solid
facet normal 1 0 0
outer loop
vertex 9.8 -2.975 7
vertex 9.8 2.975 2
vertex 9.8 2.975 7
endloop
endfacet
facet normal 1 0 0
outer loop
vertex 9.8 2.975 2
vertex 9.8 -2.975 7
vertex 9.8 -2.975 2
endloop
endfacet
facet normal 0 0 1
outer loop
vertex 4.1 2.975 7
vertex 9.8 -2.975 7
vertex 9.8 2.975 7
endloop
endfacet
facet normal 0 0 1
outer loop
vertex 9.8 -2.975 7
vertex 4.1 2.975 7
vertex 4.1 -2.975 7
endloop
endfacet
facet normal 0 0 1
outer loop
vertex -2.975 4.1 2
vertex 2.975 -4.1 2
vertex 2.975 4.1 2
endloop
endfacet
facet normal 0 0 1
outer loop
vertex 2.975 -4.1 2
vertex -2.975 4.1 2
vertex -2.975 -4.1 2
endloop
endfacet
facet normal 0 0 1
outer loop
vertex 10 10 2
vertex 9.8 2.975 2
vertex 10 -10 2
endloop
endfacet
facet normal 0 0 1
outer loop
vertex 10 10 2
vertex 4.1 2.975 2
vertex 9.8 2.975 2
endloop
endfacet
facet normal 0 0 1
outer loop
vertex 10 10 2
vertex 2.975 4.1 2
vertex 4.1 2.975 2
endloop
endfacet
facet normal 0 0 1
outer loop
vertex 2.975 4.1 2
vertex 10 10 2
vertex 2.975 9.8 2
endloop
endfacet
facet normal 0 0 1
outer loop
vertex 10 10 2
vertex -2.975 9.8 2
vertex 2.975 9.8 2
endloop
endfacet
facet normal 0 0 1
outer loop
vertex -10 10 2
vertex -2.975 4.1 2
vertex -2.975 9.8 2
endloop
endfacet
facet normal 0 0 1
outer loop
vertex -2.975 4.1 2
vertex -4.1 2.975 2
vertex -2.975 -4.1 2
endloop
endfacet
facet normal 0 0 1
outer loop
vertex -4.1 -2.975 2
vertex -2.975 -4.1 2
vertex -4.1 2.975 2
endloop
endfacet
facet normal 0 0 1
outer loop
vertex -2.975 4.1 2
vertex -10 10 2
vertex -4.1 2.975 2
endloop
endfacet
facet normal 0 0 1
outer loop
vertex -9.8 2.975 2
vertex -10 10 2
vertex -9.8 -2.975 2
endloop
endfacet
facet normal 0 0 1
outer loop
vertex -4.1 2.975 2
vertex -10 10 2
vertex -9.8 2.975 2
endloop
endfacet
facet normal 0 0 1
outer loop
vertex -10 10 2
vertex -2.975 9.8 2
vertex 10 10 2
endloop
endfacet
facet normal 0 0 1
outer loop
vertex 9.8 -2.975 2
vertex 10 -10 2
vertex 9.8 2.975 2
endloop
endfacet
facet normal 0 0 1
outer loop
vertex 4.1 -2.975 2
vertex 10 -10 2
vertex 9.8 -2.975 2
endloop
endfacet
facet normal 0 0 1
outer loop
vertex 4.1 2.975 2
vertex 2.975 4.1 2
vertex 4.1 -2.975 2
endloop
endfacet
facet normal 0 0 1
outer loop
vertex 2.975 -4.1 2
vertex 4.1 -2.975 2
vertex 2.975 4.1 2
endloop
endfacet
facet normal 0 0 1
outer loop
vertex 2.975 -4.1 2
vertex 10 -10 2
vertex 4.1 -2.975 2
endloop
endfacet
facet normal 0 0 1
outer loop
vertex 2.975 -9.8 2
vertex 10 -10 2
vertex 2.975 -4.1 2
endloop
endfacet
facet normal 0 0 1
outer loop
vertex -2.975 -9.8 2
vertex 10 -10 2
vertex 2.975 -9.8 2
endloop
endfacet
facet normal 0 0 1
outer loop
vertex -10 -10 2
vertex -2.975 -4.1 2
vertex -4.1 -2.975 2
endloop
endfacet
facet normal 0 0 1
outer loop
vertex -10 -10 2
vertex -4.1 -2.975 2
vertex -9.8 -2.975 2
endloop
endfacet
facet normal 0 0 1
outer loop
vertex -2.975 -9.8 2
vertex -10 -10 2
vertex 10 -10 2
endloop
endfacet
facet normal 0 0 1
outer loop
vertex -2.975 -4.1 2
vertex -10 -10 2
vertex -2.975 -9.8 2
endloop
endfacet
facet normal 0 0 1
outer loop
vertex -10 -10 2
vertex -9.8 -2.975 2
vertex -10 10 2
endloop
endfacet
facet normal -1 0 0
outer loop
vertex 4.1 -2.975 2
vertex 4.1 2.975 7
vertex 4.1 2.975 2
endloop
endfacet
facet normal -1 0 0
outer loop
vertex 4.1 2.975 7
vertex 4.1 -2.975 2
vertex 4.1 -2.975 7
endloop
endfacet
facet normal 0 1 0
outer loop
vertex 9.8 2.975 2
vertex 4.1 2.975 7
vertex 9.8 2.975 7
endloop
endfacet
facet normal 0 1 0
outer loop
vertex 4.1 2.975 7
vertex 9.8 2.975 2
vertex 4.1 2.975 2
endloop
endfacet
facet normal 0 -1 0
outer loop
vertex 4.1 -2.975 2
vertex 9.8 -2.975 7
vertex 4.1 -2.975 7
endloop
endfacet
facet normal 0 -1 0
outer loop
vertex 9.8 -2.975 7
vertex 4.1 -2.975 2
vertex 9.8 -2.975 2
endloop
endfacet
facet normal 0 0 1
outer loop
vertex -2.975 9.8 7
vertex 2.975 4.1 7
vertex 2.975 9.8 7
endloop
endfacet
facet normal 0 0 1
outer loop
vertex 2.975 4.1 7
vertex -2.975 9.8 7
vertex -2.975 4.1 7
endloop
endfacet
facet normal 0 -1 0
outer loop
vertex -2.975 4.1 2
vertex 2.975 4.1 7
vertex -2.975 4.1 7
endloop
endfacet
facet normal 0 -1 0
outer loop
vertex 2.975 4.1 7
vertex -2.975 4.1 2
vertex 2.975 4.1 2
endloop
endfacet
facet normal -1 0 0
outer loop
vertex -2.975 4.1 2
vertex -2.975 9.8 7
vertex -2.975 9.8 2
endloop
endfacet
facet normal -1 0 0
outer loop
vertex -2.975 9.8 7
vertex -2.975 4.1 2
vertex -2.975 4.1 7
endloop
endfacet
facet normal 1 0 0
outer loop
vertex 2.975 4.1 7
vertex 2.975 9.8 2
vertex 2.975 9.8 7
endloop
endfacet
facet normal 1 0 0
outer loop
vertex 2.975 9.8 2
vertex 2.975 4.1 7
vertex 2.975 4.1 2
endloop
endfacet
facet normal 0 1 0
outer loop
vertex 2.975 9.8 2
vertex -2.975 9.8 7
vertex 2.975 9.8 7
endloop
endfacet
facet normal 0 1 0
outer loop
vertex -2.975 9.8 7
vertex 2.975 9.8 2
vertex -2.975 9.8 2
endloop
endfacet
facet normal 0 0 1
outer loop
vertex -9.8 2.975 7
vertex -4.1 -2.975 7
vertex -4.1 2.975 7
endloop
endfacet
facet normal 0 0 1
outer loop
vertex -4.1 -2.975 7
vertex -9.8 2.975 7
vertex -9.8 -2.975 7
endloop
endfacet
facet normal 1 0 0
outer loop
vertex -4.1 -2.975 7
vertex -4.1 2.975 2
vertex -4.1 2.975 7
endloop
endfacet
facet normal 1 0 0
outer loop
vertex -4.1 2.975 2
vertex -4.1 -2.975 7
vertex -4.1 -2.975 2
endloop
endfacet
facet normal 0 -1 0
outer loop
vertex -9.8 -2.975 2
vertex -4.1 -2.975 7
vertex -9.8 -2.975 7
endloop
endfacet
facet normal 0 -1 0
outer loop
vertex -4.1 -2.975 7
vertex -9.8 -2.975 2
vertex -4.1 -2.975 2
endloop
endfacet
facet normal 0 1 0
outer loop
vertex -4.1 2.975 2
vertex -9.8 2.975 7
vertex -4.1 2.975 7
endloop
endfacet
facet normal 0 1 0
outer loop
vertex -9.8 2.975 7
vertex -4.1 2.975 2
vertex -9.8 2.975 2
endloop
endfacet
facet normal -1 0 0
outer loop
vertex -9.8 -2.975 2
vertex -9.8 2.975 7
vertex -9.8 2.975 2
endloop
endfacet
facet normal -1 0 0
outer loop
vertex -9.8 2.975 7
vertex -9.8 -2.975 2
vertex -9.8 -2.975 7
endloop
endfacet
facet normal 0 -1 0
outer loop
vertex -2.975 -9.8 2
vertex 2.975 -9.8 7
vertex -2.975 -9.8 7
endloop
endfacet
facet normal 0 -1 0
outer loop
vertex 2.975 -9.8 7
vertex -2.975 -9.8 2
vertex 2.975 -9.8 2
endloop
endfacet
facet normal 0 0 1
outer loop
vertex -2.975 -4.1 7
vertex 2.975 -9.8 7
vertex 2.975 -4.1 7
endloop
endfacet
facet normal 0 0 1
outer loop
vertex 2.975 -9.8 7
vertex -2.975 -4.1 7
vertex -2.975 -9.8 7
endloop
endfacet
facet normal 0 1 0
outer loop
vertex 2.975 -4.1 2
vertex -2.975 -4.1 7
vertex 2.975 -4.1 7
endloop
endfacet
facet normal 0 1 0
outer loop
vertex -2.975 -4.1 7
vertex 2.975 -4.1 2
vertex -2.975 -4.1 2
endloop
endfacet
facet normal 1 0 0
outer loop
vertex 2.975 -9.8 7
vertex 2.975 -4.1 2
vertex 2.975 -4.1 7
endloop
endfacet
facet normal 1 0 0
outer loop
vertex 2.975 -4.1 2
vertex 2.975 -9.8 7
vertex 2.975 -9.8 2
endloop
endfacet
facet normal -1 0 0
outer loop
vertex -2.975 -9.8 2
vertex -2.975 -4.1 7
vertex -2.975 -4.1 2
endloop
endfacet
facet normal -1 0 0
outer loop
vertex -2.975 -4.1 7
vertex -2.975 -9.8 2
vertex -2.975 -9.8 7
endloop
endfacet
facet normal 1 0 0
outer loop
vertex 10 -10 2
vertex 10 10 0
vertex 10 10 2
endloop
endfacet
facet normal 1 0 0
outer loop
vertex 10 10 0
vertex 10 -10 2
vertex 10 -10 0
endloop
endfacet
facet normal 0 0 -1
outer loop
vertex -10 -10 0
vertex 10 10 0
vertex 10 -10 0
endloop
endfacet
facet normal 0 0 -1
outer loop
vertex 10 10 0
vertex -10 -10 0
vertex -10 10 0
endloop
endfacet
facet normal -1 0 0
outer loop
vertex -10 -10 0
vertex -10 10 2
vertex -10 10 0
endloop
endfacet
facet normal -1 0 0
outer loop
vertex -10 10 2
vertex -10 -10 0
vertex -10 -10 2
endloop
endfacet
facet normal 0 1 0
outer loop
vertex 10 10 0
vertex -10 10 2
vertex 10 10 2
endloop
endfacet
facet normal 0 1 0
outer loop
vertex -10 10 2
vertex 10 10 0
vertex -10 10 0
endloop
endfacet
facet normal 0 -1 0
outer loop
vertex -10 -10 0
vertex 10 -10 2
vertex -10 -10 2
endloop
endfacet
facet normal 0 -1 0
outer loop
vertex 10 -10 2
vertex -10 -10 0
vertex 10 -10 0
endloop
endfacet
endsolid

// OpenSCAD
// End cap for the 2020 profile, press fit. Print 4 plus spares.
// Print orientation: plate on the bed.
include <params.scad>
include <lib.scad>

end_cap();
